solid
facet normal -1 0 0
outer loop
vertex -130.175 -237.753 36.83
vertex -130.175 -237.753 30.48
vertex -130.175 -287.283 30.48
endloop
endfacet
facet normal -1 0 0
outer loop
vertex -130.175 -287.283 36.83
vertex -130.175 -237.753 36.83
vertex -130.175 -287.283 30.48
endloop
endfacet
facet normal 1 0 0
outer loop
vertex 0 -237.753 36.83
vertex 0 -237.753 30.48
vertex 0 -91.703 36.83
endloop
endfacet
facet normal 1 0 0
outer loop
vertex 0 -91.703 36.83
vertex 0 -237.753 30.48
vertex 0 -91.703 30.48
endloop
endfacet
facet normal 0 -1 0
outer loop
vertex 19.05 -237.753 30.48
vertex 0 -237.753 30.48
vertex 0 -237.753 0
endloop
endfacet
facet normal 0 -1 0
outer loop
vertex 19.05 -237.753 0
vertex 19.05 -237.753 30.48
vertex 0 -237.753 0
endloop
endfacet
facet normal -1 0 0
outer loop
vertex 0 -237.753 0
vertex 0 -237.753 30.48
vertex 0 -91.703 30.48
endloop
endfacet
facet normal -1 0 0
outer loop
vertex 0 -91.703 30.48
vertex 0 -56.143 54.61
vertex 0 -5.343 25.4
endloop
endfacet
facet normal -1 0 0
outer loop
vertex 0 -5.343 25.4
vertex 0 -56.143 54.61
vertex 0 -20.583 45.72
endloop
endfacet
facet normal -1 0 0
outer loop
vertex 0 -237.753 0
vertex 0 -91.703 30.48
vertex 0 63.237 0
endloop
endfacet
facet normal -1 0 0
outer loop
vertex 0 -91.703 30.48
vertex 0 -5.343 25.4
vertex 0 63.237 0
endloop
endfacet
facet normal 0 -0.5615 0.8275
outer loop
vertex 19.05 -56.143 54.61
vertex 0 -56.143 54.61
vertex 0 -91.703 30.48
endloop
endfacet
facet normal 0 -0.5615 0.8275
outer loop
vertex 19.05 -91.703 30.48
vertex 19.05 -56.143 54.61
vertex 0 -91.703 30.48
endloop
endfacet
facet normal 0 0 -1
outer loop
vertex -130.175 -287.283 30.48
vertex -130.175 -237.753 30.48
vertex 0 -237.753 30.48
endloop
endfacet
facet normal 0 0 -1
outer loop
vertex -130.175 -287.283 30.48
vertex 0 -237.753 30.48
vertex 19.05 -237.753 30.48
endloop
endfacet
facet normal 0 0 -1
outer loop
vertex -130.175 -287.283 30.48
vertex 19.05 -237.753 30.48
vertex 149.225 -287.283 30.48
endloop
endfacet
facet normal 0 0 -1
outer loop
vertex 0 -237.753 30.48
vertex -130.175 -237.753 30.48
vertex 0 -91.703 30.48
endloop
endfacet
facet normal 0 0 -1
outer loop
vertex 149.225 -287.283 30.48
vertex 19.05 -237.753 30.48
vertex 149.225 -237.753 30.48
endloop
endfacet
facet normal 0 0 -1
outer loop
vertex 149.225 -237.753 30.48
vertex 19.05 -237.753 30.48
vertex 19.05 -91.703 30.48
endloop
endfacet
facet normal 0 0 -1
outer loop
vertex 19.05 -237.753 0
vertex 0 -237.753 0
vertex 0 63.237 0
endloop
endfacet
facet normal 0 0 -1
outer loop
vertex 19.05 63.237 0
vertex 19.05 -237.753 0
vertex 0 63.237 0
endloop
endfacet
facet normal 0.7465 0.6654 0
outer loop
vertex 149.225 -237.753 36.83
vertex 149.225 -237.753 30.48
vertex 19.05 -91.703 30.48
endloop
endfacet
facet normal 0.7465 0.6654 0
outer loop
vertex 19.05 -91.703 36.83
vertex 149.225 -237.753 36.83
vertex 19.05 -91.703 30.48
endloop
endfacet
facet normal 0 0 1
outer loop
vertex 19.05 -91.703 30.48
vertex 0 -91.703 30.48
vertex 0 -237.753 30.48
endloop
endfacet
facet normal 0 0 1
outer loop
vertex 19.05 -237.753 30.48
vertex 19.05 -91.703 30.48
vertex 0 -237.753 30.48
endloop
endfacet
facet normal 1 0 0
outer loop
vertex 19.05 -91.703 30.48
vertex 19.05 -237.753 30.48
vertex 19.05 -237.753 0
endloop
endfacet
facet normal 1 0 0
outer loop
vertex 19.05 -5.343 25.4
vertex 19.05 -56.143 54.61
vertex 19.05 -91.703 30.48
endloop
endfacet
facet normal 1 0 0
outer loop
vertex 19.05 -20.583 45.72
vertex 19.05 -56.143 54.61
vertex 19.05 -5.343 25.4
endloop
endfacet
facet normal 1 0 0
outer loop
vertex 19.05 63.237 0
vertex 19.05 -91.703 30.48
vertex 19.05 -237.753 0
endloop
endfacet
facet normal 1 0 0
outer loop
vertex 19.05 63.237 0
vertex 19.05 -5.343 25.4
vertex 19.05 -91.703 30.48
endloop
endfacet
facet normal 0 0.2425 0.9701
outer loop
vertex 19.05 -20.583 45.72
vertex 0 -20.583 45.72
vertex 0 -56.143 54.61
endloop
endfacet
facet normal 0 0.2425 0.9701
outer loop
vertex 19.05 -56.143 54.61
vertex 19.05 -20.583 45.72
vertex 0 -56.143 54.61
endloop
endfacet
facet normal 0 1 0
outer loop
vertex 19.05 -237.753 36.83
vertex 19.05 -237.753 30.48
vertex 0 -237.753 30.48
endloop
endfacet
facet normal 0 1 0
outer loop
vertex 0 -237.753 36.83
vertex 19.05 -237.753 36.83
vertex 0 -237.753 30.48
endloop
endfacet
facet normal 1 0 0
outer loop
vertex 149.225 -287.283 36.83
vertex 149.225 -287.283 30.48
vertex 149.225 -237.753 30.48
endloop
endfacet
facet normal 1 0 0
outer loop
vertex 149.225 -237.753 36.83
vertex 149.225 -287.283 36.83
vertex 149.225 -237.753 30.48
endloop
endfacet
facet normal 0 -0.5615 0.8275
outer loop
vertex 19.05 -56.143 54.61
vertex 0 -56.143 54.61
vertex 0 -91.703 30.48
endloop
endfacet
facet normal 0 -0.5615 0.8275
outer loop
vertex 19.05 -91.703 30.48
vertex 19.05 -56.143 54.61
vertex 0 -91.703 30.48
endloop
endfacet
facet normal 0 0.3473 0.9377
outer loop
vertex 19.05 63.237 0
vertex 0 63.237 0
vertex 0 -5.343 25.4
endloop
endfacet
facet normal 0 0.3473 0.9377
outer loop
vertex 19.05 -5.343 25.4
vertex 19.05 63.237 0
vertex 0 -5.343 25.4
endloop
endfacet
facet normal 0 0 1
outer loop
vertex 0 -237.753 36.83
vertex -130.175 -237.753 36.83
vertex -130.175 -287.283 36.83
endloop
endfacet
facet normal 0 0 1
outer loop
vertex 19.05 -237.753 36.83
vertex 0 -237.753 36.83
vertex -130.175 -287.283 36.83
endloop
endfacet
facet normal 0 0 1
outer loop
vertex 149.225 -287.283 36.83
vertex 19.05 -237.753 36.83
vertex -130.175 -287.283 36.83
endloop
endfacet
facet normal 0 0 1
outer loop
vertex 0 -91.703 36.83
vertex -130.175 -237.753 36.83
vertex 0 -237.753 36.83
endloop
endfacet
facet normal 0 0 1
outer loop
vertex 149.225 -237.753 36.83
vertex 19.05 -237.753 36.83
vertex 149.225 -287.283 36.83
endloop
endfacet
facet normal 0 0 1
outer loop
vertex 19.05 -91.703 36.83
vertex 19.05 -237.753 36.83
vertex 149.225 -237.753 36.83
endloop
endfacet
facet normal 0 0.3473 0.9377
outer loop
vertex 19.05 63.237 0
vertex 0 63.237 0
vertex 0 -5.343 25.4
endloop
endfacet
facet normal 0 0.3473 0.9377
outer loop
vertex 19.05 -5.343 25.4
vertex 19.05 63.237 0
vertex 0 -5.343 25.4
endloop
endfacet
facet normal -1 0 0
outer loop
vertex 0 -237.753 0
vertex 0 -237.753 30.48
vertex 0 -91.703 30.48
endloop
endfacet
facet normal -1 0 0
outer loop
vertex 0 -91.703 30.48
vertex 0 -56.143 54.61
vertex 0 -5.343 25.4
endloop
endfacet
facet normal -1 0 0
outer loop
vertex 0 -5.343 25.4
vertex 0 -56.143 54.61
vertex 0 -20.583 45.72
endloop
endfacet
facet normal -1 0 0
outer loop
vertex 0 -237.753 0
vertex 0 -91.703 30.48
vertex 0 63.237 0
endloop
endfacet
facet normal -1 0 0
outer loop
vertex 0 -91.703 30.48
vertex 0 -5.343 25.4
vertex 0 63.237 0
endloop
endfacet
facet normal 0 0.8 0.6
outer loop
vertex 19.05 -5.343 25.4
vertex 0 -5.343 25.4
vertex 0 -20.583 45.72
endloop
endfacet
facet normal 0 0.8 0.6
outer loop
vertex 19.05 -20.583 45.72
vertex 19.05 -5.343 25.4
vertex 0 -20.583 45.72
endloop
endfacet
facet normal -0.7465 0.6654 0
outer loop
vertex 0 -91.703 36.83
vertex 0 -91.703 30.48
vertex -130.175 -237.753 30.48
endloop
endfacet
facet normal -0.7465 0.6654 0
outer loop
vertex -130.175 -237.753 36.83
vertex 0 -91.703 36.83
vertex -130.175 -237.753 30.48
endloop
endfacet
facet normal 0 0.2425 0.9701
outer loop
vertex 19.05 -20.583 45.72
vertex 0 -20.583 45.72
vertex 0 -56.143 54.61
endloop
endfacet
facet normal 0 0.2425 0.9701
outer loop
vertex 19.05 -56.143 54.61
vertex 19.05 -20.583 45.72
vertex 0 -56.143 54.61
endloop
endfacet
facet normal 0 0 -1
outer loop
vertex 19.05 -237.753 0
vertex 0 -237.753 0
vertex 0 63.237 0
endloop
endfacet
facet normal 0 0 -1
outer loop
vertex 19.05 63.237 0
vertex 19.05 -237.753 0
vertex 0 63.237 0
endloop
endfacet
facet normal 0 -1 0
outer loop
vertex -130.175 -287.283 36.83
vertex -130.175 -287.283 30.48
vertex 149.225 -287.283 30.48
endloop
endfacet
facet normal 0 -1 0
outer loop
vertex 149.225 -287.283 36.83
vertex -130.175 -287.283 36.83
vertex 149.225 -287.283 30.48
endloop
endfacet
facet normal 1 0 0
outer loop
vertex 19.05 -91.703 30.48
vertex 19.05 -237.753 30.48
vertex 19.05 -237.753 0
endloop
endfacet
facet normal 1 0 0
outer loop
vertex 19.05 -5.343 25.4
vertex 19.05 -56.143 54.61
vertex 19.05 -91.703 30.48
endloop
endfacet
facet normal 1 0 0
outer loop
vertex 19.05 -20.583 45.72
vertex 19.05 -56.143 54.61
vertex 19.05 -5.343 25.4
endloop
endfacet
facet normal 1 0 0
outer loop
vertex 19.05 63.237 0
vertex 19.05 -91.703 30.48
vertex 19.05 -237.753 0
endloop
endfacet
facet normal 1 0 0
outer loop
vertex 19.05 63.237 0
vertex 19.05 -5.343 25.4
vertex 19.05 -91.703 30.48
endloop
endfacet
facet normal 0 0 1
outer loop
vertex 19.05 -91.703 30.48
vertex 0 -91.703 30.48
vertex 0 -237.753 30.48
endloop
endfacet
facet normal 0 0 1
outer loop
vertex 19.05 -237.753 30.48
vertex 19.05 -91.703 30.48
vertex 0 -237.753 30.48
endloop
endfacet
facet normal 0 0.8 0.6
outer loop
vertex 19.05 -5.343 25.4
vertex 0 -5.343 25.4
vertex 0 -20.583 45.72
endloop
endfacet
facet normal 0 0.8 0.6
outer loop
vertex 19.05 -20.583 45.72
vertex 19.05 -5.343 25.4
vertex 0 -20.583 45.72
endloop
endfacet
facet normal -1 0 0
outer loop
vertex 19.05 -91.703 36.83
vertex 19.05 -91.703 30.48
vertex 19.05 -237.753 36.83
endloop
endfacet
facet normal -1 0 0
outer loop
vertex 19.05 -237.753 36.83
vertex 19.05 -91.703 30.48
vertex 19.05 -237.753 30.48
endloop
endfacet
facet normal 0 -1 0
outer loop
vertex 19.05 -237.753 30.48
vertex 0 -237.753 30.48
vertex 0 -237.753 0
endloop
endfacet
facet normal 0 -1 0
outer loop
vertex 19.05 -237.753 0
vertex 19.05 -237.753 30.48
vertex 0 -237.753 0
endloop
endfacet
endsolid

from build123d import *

# Parameters (mm, degrees)
F1_DEPTH = 19.05
F2_DEPTH = 19.05
F4_DEPTH = 6.35


with BuildPart() as f1:
    # F0 (on Right) → F1 (new body)
    with BuildSketch(Plane.YZ):
        Polygon((-237.752856, 30.48), (-237.752856, 0), (63.237144, 0), (-5.342856, 25.4), (-20.582856, 45.72), (-56.142856, 54.61), (-91.702856, 30.48), align=None)
    extrude(amount=F1_DEPTH)


with BuildPart() as f2:
    # F0 (on Right) → F2 (new body)
    with BuildSketch(Plane.YZ):
        Polygon((-237.752856, 30.48), (-237.752856, 0), (63.237144, 0), (-5.342856, 25.4), (-20.582856, 45.72), (-56.142856, 54.61), (-91.702856, 30.48), align=None)
    extrude(amount=F2_DEPTH)


with BuildPart() as f4:
    # F3 (on face) → F4 (new body)
    with BuildSketch(Plane.XY.offset(30.48)):
        Polygon((-130.175, -287.282856), (149.225, -287.282856), (149.225, -237.752856), (19.05, -91.702856), (19.05, -237.752856), (0, -237.752856), (0, -91.702856), (-130.175, -237.752856), align=None)
    extrude(amount=F4_DEPTH)


solid = Compound([f1.part, f2.part, f4.part])
